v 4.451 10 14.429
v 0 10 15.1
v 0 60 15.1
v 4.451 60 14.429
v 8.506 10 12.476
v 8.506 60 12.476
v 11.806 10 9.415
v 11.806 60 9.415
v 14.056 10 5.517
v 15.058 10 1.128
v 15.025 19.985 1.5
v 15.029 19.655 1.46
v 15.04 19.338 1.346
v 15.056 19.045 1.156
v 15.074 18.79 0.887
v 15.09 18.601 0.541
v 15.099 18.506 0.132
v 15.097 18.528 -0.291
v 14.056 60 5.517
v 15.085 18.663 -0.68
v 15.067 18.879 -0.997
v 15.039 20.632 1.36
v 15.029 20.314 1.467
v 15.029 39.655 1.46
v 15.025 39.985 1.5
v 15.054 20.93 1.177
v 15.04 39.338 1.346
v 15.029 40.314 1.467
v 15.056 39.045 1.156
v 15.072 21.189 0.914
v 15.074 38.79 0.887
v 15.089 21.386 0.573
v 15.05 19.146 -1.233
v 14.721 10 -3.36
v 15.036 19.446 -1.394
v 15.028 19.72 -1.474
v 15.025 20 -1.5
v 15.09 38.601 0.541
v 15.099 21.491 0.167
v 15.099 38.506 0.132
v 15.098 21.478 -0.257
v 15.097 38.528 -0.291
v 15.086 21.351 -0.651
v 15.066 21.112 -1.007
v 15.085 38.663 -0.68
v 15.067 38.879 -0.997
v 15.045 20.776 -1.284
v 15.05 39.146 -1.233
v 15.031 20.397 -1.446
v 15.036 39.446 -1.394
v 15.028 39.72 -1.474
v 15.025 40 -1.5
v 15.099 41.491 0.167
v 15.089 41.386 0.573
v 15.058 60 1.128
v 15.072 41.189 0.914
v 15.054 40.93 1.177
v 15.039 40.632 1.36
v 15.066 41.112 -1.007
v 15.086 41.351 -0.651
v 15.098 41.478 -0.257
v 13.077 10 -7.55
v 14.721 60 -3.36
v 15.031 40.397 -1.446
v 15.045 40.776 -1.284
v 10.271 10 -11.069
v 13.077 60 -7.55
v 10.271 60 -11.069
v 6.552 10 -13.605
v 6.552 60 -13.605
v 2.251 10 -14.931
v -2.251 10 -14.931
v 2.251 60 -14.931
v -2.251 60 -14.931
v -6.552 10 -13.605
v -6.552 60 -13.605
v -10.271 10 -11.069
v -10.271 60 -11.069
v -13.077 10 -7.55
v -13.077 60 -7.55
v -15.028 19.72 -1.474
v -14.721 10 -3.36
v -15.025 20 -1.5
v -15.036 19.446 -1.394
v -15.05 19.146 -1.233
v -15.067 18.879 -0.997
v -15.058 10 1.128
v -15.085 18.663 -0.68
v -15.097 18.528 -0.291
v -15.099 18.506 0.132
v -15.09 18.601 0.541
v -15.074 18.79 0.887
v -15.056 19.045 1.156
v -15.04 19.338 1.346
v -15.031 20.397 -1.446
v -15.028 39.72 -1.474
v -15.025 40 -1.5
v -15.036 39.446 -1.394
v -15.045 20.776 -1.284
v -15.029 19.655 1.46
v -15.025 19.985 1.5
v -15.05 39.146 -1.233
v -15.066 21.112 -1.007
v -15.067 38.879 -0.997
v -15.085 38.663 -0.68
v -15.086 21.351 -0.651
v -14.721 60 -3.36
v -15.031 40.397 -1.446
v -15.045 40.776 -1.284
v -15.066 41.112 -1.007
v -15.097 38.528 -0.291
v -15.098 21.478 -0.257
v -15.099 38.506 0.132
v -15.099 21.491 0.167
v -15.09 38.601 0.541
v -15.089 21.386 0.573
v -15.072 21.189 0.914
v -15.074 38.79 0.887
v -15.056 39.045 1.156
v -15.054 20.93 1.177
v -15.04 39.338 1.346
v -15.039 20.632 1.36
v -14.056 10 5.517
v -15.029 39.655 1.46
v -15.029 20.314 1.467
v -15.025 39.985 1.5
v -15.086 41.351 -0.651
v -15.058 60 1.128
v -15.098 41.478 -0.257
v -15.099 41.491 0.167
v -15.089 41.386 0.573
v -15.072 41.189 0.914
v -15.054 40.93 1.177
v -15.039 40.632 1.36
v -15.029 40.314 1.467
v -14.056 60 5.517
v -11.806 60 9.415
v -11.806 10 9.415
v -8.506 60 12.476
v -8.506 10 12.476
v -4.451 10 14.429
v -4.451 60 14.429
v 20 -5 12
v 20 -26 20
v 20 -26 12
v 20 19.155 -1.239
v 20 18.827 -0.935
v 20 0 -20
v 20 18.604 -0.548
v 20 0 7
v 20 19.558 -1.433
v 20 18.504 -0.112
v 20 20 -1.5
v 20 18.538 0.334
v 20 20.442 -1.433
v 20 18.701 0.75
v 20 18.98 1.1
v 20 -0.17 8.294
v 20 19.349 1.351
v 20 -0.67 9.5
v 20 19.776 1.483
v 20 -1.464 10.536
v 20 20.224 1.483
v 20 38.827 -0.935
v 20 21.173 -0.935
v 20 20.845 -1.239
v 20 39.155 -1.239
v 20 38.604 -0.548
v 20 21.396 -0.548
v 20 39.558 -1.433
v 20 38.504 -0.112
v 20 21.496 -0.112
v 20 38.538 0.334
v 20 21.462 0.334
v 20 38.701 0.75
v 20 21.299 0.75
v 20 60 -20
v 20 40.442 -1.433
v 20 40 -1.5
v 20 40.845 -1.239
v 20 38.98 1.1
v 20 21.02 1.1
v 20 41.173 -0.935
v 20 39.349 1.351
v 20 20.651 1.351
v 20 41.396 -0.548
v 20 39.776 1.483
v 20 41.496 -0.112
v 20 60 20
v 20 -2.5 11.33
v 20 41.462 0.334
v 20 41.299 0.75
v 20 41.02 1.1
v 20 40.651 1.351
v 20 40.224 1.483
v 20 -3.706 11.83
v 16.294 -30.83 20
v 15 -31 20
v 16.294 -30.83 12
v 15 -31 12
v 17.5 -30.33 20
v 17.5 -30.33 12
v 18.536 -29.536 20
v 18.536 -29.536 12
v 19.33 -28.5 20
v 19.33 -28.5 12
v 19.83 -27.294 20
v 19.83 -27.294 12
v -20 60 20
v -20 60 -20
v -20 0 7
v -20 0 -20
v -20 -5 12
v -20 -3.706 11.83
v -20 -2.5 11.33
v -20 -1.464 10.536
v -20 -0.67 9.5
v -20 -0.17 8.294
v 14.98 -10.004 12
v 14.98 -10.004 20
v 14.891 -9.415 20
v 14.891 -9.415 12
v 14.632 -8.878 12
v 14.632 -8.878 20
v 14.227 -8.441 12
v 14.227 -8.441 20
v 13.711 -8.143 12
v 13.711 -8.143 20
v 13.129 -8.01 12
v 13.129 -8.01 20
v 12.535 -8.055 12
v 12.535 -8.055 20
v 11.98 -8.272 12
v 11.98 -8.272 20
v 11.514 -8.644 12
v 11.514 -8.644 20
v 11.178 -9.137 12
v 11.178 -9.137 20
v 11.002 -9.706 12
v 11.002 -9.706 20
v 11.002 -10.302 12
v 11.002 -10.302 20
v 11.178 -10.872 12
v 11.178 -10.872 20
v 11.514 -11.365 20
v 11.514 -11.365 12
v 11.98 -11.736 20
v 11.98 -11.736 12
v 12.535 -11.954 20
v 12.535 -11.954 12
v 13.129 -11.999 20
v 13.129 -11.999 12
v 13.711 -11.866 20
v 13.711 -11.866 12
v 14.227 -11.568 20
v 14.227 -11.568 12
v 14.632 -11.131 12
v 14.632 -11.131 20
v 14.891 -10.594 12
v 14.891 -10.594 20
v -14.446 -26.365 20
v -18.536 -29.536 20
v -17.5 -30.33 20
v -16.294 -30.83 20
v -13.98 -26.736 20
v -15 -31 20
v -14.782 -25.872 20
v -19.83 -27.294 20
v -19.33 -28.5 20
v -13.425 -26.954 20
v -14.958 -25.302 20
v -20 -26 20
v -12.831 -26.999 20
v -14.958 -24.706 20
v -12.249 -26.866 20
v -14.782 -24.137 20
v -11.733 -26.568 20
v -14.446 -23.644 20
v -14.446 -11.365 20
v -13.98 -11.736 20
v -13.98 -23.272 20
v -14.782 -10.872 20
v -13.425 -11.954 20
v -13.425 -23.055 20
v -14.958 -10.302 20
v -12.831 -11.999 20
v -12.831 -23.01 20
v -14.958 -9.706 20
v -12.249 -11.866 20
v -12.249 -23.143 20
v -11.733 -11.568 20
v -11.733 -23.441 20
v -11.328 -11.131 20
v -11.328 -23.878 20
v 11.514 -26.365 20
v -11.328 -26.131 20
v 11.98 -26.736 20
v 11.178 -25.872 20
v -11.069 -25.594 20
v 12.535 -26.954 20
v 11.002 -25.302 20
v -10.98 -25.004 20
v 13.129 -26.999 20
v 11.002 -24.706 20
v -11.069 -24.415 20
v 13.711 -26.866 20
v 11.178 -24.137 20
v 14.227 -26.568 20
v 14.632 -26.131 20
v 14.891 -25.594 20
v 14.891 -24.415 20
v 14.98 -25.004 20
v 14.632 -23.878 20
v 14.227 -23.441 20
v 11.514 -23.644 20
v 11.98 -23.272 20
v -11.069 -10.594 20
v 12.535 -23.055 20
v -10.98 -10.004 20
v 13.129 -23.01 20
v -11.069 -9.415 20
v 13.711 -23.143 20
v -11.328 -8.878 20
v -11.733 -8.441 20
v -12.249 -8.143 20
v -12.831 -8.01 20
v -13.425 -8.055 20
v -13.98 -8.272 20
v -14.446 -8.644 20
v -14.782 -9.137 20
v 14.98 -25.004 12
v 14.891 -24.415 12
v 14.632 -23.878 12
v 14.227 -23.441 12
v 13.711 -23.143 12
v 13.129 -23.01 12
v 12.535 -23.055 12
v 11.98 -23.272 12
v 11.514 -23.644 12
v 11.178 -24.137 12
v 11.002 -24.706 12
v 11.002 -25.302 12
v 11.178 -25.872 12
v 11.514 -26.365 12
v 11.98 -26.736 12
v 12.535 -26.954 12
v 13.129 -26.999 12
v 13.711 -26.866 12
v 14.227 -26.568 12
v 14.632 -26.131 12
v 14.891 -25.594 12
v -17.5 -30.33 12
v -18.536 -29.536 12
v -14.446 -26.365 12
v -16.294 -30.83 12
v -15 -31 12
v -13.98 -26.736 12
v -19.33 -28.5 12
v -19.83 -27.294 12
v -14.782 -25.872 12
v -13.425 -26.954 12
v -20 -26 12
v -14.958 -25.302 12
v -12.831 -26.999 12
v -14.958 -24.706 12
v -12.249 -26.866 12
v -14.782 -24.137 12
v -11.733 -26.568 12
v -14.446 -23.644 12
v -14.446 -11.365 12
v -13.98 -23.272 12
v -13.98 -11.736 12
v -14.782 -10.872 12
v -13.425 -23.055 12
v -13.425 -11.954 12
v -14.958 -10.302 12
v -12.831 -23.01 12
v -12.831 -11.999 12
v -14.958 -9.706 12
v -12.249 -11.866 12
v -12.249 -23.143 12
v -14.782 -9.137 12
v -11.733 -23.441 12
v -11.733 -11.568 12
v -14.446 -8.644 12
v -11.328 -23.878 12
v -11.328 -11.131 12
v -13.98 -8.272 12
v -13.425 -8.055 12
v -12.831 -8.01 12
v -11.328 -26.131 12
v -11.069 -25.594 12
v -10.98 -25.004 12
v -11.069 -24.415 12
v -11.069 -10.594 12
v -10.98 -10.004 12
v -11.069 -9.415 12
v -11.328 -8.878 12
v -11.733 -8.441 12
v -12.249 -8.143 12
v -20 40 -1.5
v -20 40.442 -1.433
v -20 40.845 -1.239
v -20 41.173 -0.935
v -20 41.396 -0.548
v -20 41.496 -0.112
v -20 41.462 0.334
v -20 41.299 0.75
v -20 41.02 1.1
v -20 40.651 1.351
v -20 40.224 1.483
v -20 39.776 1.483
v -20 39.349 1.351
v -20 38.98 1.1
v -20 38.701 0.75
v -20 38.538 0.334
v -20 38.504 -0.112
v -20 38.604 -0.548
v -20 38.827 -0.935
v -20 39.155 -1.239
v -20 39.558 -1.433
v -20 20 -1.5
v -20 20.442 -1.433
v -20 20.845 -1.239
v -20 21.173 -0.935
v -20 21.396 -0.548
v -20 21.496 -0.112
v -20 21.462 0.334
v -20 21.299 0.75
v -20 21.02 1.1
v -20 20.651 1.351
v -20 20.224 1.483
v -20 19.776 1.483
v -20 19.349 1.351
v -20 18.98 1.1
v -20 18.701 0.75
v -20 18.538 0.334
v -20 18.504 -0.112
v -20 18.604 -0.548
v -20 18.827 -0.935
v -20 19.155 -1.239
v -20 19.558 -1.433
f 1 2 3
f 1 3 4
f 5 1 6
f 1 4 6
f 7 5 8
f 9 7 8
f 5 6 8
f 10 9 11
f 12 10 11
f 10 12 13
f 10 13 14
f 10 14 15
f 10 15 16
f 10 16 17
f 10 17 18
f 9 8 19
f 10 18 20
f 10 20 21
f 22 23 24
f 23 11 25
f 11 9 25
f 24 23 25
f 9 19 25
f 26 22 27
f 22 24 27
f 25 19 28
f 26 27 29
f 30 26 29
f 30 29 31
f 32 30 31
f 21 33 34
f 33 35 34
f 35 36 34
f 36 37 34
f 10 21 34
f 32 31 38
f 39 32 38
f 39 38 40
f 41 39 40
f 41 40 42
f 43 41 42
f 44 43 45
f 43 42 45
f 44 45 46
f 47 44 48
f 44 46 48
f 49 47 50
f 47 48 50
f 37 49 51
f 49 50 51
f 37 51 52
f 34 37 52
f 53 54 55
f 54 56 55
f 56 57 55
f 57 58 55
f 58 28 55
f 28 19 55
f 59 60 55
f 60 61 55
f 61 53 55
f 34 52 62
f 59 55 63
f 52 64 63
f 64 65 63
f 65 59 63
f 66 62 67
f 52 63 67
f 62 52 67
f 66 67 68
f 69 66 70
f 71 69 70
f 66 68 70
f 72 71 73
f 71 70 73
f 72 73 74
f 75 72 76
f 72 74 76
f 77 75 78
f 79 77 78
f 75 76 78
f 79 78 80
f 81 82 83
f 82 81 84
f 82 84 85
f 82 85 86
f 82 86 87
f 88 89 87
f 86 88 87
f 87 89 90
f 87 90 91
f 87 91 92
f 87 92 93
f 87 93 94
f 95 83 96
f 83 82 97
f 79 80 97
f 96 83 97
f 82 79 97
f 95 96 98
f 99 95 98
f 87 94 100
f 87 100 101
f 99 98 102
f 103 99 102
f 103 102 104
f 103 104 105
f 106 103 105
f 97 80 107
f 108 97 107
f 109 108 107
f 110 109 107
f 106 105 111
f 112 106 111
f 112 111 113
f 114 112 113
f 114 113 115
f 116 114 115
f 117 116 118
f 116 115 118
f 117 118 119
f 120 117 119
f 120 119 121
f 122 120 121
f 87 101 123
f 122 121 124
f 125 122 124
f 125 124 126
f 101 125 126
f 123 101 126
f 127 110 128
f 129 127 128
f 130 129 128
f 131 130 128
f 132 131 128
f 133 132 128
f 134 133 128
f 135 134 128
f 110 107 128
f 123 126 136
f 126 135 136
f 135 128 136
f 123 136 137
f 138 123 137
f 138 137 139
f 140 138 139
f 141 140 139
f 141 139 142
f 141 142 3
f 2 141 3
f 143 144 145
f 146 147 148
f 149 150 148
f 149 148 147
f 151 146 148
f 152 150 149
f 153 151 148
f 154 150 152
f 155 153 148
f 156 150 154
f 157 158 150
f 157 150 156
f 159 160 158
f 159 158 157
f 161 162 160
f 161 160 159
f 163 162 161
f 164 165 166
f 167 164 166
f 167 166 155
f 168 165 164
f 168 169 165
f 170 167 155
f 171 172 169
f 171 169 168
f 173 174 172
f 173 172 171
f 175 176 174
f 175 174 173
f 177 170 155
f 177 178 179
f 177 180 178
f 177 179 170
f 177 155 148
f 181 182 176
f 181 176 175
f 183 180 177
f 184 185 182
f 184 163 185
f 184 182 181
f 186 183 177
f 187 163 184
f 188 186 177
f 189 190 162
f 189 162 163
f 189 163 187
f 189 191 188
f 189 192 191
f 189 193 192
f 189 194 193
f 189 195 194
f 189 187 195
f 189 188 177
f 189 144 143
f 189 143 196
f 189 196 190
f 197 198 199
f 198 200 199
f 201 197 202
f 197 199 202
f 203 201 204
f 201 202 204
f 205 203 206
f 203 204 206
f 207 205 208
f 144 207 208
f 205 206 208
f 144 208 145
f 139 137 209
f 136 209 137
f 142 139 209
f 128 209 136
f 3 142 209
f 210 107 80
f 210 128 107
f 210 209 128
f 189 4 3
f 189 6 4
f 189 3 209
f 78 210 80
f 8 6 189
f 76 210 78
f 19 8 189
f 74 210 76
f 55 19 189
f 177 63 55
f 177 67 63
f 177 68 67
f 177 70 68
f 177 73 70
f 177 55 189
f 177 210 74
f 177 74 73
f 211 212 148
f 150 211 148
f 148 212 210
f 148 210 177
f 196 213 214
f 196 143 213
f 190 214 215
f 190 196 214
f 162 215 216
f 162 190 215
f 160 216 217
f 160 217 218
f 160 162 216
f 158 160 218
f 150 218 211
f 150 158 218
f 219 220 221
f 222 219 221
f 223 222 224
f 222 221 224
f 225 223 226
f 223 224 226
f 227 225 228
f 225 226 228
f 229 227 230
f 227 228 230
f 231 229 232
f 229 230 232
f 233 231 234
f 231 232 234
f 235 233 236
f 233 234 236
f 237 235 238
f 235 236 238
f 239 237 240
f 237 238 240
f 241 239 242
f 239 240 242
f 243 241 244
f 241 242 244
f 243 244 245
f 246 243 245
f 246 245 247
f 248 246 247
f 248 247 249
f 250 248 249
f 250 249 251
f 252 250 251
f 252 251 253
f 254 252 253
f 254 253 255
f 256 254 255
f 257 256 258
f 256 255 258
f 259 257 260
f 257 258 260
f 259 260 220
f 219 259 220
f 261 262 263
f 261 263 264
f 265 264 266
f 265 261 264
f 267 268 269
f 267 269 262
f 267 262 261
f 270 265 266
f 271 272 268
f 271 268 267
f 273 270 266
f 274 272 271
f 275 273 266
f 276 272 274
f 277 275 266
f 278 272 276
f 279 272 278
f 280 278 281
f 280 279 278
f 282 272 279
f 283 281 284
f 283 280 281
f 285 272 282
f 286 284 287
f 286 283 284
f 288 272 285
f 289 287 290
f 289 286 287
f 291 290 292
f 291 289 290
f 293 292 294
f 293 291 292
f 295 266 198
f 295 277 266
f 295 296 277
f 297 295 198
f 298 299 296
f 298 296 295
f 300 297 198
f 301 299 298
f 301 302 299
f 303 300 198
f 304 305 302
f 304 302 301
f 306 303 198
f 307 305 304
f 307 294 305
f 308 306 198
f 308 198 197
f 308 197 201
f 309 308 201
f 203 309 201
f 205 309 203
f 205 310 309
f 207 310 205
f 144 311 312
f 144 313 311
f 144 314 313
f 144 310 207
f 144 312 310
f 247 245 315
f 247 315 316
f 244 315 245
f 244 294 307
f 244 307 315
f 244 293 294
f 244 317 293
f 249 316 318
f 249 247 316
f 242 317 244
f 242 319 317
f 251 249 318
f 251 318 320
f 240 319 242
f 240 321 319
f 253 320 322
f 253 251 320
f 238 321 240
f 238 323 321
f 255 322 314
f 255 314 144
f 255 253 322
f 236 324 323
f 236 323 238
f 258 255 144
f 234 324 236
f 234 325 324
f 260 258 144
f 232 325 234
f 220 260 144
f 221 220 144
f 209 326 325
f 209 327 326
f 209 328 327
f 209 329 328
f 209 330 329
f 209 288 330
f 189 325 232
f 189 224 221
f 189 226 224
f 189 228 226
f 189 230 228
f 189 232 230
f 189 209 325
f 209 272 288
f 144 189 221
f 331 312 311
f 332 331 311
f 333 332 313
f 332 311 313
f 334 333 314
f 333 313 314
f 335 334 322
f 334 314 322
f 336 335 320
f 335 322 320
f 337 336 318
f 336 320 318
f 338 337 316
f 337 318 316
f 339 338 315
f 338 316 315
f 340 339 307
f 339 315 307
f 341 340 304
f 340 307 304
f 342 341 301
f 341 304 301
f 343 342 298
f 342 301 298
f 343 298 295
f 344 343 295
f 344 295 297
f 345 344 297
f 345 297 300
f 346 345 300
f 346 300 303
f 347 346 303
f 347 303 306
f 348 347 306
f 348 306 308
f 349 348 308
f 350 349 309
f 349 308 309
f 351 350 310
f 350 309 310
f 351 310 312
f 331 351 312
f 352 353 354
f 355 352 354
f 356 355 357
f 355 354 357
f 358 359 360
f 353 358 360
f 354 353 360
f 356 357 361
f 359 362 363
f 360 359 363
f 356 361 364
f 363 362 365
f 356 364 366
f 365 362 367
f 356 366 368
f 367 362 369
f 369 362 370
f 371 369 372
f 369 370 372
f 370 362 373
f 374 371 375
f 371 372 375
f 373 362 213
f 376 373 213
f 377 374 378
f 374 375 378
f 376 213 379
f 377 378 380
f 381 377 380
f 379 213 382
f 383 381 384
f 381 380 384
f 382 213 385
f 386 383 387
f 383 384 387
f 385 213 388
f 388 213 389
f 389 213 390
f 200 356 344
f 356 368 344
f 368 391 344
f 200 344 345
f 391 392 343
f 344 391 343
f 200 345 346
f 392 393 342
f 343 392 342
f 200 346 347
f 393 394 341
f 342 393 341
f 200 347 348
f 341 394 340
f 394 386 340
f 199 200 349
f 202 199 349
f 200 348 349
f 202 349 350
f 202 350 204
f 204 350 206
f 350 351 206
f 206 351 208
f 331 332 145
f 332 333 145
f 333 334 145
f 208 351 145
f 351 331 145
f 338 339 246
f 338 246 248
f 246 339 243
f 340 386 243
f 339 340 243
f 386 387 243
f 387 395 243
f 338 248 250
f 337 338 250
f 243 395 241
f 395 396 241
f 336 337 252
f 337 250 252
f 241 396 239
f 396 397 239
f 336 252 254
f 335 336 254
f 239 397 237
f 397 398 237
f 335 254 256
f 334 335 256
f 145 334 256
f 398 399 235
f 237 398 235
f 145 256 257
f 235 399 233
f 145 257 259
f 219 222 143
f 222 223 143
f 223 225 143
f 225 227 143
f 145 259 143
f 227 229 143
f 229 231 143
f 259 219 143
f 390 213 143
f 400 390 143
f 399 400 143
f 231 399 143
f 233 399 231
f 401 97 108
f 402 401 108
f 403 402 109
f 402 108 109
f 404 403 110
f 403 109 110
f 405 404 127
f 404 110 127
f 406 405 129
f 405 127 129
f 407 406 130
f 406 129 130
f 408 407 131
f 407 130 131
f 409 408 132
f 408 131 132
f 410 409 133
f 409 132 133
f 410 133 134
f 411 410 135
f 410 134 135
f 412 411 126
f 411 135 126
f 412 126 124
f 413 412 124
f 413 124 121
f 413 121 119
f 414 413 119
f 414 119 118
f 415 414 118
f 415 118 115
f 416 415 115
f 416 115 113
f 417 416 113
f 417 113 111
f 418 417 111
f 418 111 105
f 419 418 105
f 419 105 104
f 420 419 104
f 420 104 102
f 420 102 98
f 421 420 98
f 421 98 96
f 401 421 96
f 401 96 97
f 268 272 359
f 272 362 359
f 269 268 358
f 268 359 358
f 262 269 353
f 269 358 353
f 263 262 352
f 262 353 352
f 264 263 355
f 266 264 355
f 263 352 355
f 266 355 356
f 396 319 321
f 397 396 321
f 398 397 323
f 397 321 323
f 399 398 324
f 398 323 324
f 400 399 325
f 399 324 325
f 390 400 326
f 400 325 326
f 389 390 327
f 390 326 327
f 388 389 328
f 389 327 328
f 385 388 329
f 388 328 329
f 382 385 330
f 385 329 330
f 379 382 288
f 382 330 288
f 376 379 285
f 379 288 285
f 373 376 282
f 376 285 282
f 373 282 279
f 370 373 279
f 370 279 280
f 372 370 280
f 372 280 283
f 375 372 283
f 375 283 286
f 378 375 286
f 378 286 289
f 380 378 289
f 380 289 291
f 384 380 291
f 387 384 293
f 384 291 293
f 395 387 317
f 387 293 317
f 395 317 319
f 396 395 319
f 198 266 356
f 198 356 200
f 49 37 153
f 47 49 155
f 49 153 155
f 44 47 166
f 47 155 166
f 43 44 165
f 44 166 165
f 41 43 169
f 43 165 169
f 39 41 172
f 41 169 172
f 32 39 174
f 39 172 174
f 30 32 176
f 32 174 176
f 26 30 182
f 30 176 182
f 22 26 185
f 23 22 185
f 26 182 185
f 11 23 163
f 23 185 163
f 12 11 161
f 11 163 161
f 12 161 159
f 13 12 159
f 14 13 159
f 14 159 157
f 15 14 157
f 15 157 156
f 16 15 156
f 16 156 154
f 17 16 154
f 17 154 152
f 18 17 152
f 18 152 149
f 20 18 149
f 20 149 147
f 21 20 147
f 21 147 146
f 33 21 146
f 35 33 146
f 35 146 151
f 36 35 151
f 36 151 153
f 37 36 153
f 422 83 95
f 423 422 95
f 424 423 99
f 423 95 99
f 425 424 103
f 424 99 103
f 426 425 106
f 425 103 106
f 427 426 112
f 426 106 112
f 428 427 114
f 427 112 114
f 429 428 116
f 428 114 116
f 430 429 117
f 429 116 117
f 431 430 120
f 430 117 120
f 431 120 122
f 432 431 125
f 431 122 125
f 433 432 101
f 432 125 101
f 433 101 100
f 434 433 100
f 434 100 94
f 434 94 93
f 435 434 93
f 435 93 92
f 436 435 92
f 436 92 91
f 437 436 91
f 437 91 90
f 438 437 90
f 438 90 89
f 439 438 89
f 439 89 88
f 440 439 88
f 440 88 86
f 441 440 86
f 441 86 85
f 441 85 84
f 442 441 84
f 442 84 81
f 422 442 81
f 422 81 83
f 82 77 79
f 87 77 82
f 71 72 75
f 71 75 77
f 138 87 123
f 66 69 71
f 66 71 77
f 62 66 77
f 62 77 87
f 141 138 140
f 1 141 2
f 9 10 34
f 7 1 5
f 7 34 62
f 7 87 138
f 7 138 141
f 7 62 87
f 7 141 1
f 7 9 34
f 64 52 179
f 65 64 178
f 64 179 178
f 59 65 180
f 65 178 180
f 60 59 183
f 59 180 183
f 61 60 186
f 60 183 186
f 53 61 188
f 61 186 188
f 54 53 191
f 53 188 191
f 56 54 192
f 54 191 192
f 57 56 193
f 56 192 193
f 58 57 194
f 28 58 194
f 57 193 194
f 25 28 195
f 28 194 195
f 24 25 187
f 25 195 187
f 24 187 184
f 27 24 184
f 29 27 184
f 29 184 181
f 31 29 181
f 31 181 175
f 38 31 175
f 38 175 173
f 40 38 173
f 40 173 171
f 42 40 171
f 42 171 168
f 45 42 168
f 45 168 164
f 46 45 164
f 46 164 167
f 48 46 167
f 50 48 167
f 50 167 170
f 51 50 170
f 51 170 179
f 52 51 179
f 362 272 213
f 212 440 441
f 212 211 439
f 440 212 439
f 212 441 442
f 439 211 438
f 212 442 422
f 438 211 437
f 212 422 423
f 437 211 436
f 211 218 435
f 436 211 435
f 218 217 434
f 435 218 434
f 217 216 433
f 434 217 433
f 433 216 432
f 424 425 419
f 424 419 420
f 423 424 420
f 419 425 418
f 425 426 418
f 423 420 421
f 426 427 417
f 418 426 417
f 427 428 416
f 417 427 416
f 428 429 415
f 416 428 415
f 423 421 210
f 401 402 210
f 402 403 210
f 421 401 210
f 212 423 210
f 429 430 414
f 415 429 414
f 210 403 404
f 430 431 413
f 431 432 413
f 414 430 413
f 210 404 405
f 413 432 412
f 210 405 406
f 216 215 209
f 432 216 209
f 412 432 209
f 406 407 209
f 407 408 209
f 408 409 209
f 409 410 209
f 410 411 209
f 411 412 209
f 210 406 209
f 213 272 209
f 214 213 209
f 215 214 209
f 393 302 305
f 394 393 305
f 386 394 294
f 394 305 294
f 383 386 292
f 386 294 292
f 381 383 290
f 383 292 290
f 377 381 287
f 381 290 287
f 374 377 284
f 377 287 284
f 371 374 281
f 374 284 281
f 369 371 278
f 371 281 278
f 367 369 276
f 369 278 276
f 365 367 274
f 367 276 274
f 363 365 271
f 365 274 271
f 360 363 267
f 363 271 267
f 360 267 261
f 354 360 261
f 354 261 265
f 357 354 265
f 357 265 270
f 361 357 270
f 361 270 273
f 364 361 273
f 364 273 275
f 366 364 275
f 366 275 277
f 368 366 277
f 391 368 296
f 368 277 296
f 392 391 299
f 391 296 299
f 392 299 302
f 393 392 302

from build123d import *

# Parameters (mm, degrees)
SKETCH_1_W             = 40
SKETCH_1_H             = 40
EXTRUDE_1_DEPTH        = 60
SKETCH_2_R             = 15.1
CUT_EXTRUDE_1_DEPTH    = 50
SKETCH_3_W             = 40
SKETCH_3_H             = 31
SKETCH_3_R             = 2
EXTRUDE_2_DEPTH        = 8
SKETCH_4_R             = 1.5
CUT_EXTRUDE_2_DEPTH    = 75.833147735
PATTERN_LINEAR_1_COUNT = 2
PATTERN_LINEAR_1_PITCH = 20
FILLET_1_R             = 5


with BuildPart() as part:
    # 草圖1 → 填料-伸長1 (new body)
    with BuildSketch(Plane(origin=(0, 0, 0), x_dir=(1, 0, 0), z_dir=(0, 1, 0))):
        Rectangle(SKETCH_1_W, SKETCH_1_H)
    extrude(amount=EXTRUDE_1_DEPTH)

    # 草圖2 → 除料-伸長1 (cut)
    with BuildSketch(Plane(origin=(0, 60, 0), x_dir=(1, 0, 0), z_dir=(0, 1, 0))):
        with Locations(Location((0, 0, 0), (0, 0, 270))):
            Circle(SKETCH_2_R)
    extrude(amount=-CUT_EXTRUDE_1_DEPTH, mode=Mode.SUBTRACT)

    # 草圖3 → 填料-伸長2 (add)
    with BuildSketch(Plane.XY.offset(20)):
        with Locations((0, -15.5)):
            Rectangle(SKETCH_3_W, SKETCH_3_H)
        with Locations((-12.98, -10.004389258)):
            Circle(SKETCH_3_R, mode=Mode.SUBTRACT)
        with Locations((12.98, -10.004389258)):
            Circle(SKETCH_3_R, mode=Mode.SUBTRACT)
        with Locations((-12.98, -25.004389258)):
            Circle(SKETCH_3_R, mode=Mode.SUBTRACT)
        with Locations((12.98, -25.004389258)):
            Circle(SKETCH_3_R, mode=Mode.SUBTRACT)
    extrude(amount=-EXTRUDE_2_DEPTH)

    # 草圖4 → 除料-伸長2 (cut, through all)
    with BuildSketch(Plane(origin=(20, 0, 0), x_dir=(0, 0, -1), z_dir=(1, 0, 0))):
        with Locations((0, 20)):
            Circle(SKETCH_4_R)
    cut_extrude_2 = extrude(amount=-CUT_EXTRUDE_2_DEPTH, mode=Mode.SUBTRACT)

    # 直線複製排列1: 除料-伸長2 ×2
    with Locations(*[(0, i * PATTERN_LINEAR_1_PITCH, 0) for i in range(1, PATTERN_LINEAR_1_COUNT)]):
        add(cut_extrude_2, mode=Mode.SUBTRACT)

    # 圓角1
    fillet_1_edges = [part.edges().sort_by_distance(p)[0] for p in [
        (-20, -31, 16),
        (0, 0, 12),
        (20, -31, 16),
    ]]
    fillet(fillet_1_edges, radius=FILLET_1_R)


solid = part.part
